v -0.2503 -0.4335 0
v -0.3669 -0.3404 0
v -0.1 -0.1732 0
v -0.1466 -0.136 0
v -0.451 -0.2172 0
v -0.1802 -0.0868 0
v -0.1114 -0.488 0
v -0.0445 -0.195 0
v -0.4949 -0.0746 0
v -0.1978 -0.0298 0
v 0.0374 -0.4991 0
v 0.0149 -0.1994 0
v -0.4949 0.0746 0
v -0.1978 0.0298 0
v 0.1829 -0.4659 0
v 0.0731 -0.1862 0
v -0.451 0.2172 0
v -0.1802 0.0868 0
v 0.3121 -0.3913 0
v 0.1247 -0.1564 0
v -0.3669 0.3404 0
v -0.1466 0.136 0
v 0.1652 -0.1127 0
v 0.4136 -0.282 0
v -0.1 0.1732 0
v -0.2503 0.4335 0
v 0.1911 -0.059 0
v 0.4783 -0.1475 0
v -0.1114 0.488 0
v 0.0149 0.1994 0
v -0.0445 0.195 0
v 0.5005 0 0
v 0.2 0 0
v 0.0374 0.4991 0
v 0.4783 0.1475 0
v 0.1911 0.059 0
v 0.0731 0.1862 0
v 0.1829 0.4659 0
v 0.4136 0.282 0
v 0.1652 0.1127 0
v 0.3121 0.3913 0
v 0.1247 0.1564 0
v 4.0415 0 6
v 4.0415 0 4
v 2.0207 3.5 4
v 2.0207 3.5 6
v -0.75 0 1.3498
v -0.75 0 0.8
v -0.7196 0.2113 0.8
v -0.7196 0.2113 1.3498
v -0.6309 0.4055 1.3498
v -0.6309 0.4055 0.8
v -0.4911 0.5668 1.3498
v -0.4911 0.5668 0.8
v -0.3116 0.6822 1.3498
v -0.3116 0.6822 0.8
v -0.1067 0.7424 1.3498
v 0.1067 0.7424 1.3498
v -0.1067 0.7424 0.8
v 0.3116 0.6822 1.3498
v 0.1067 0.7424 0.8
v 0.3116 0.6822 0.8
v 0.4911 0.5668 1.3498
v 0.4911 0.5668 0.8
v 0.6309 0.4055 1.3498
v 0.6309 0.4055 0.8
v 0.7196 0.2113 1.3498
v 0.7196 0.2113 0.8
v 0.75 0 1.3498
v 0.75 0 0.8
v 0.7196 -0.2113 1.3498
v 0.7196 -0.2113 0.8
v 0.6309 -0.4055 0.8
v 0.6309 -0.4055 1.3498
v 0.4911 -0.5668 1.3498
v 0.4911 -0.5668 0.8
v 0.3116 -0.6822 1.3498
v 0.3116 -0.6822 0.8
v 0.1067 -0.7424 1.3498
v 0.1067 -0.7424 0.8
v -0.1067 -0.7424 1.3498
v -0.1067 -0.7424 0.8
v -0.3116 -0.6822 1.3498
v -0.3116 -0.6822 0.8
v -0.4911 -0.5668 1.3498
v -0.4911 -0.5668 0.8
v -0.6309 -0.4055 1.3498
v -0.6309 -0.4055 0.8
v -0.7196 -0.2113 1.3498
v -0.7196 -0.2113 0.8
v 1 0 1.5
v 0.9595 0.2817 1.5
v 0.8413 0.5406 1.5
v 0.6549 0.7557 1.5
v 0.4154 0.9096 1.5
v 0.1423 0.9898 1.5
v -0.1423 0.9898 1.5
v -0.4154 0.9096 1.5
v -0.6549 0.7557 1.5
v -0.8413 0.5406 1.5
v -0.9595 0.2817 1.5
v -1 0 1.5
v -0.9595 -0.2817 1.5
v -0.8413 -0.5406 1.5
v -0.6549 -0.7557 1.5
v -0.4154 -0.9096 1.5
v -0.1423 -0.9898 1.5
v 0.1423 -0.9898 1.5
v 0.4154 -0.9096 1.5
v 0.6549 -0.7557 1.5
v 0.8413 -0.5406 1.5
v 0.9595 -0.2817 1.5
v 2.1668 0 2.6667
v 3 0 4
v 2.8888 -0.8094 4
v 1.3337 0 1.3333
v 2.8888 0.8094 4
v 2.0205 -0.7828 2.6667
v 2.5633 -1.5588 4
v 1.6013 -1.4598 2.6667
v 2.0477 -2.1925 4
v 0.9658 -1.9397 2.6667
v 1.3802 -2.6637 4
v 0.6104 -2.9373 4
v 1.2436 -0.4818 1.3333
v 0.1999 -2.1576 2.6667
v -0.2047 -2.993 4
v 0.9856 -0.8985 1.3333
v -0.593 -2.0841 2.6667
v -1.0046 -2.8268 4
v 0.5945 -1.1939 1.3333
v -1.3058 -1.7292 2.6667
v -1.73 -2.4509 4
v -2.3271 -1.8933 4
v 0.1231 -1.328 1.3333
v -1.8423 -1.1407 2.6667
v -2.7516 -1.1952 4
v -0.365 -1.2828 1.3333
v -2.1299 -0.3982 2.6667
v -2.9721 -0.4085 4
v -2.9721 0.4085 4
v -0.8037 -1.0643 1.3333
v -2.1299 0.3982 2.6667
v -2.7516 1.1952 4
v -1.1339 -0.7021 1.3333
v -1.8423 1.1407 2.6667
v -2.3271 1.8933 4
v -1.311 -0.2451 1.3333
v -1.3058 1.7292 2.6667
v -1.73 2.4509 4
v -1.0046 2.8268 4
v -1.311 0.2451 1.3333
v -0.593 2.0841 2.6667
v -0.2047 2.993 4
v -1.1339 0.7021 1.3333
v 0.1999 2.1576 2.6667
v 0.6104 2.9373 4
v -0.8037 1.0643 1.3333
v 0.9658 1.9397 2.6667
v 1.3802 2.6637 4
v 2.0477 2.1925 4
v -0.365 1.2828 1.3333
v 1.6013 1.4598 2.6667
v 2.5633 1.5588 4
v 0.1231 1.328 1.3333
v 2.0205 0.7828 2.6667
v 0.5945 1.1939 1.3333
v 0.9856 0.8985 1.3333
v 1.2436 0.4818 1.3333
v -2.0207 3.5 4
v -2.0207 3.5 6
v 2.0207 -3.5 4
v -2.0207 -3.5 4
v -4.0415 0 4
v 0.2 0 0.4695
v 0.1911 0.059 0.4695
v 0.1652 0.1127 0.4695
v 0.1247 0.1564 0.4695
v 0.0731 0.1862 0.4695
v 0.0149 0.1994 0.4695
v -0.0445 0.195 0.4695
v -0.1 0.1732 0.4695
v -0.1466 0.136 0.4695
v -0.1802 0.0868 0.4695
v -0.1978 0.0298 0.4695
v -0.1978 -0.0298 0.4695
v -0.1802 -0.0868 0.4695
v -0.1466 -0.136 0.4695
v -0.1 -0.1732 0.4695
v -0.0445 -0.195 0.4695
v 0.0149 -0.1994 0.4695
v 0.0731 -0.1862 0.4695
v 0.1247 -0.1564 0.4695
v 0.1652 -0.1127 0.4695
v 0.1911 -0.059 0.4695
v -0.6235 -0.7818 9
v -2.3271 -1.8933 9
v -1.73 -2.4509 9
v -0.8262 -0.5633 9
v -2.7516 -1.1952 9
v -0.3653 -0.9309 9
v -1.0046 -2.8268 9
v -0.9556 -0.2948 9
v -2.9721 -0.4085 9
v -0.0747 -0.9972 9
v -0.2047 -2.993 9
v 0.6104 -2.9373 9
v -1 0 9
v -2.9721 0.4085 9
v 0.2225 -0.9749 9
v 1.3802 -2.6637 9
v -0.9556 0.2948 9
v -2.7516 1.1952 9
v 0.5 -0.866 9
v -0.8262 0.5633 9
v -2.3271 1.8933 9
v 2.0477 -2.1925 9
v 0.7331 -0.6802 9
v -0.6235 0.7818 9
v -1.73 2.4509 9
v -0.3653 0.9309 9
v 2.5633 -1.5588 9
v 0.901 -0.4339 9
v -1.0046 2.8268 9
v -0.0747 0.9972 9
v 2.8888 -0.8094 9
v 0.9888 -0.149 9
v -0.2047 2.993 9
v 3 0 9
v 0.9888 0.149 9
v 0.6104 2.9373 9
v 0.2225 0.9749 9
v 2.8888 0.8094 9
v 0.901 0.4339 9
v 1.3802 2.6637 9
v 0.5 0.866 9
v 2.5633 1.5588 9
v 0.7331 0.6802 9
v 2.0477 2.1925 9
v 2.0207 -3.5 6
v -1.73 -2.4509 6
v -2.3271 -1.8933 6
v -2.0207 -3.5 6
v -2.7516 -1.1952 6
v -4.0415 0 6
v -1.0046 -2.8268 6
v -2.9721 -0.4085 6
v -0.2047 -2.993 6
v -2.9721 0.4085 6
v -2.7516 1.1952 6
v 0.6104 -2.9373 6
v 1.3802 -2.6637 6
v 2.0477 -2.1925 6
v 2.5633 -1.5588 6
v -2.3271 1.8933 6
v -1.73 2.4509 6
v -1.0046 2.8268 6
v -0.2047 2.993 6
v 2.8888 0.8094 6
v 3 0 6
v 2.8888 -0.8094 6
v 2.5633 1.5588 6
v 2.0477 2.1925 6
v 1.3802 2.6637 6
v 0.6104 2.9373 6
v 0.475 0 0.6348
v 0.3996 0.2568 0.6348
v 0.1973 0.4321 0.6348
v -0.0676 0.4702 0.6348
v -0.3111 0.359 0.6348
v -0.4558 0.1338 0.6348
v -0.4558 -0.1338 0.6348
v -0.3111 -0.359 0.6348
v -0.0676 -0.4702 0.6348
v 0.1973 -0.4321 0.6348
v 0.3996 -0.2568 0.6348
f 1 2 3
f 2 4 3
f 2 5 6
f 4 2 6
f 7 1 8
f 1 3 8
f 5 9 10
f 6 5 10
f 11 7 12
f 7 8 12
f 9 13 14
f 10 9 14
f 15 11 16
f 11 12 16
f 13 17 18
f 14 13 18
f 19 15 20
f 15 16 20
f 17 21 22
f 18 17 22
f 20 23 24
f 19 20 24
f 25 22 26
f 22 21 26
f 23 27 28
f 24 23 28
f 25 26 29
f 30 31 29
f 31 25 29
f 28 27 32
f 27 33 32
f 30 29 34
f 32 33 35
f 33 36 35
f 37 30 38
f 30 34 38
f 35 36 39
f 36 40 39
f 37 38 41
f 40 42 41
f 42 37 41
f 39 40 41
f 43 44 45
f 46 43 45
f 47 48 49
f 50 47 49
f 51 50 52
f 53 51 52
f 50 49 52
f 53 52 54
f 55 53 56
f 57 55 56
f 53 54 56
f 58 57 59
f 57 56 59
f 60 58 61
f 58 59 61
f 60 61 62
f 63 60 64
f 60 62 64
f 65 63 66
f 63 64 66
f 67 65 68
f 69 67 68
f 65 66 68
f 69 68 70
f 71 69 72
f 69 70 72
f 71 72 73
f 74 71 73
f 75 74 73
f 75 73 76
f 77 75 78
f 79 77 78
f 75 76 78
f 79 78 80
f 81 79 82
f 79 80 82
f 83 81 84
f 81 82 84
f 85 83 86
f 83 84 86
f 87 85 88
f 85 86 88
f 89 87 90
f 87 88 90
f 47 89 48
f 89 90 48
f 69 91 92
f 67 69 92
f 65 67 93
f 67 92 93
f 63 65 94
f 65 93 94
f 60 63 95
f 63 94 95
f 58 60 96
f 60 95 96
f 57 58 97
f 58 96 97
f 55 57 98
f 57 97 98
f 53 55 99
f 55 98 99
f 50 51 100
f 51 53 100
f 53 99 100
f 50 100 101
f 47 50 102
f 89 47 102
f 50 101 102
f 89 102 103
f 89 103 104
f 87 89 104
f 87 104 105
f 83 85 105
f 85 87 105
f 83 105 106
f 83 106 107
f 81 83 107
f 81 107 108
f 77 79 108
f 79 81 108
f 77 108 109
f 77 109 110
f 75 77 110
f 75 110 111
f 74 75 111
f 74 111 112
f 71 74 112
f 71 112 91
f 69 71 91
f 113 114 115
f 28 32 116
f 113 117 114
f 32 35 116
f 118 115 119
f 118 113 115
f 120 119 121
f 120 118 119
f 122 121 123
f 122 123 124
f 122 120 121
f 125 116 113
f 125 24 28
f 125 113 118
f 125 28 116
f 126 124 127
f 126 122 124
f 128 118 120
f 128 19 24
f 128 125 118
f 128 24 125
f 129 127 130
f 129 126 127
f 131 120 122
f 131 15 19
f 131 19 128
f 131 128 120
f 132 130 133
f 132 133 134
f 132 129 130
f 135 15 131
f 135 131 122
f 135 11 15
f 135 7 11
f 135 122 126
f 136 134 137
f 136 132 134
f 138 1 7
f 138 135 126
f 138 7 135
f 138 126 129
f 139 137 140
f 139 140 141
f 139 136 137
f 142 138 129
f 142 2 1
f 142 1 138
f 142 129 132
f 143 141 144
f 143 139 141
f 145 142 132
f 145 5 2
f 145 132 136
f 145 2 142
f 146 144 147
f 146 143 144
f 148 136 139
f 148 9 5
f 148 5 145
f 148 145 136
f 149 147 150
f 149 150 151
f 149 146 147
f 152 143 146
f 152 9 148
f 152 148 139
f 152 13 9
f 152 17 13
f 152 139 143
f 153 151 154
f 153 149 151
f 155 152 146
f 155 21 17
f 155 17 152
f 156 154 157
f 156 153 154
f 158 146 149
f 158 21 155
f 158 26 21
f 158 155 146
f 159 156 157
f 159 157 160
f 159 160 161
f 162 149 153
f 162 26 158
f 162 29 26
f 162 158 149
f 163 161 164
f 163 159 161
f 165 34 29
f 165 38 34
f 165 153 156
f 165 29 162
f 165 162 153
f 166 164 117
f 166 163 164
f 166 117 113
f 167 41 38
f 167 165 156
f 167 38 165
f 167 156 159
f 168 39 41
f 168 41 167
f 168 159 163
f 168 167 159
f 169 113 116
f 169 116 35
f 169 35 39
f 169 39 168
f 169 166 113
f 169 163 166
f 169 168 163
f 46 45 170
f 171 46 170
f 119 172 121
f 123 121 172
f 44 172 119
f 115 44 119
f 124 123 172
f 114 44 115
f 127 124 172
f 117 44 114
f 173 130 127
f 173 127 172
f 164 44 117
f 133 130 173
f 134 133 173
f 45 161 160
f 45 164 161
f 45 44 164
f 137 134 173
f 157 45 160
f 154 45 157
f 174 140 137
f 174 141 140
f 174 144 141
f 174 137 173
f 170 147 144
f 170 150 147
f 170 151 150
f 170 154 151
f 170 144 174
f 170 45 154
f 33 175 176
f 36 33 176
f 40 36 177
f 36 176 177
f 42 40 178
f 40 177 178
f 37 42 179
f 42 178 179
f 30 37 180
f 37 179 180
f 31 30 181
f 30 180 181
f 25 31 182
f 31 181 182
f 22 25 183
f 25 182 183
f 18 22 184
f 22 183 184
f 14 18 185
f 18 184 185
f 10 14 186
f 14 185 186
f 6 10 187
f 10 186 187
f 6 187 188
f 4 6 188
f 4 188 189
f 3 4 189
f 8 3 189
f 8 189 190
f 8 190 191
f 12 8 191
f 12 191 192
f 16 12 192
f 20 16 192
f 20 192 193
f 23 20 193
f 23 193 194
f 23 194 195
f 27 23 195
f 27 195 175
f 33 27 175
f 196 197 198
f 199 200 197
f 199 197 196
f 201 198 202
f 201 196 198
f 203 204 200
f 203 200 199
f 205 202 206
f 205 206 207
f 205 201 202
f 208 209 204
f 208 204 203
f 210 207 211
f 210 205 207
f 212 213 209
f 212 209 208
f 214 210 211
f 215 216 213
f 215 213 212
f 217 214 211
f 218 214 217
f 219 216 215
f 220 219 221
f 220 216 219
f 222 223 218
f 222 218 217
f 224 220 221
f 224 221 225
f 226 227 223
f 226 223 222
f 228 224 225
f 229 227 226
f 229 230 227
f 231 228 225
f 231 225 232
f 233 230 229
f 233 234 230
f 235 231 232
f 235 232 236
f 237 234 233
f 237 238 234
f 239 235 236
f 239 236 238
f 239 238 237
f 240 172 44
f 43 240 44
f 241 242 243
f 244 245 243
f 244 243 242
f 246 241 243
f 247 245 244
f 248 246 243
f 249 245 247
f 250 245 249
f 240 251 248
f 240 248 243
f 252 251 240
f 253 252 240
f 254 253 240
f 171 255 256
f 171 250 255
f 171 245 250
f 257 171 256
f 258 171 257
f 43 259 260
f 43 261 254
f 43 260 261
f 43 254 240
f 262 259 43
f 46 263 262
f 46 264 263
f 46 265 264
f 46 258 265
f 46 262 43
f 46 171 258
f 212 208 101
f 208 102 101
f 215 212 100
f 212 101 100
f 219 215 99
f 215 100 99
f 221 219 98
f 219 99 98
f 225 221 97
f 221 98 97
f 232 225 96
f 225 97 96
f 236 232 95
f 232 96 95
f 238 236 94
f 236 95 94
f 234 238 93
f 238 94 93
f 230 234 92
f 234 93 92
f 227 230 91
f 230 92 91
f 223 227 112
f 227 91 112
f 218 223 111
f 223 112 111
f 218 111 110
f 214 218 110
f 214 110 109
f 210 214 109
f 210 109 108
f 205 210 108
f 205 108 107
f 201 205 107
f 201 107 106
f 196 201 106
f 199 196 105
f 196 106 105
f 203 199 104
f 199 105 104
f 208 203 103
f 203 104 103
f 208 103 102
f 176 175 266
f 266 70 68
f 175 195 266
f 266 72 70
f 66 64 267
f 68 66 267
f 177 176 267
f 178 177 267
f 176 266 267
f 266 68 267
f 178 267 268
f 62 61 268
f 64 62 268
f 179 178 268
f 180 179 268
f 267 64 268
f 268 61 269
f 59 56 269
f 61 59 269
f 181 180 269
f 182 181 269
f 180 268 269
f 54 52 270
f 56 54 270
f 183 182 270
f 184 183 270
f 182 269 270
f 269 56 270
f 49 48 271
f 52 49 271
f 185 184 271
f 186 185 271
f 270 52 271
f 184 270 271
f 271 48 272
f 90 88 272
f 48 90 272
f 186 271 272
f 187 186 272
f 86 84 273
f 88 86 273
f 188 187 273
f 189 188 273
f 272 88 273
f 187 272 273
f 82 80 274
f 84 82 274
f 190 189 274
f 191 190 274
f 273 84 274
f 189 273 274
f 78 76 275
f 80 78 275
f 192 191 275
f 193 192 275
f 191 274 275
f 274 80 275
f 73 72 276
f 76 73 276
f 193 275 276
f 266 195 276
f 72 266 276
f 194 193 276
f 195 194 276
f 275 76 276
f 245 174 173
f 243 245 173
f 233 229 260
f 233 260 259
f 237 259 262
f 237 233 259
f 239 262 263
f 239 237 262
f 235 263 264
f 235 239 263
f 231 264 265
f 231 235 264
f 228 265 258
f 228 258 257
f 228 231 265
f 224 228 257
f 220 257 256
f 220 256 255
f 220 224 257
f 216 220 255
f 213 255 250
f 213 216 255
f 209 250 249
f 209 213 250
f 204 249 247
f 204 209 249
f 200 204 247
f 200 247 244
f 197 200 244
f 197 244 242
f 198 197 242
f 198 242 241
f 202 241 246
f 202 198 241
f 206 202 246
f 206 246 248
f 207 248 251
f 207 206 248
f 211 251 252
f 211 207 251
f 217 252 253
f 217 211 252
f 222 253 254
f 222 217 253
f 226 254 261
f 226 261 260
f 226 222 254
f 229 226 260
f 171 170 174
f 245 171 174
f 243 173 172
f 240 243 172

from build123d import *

# Parameters (mm, degrees)
BOSS_EXTRU_1_DEPTH                  = 9
ESQUISSE2_W                         = 15.557161579
ESQUISSE2_H                         = 11.468773674
ESQUISSE2_R                         = 3
ENL_V_MAT_EXTRU_1_DEPTH             = 3
DIAM_TRE_DU_PER_AGE_2_0_2_1_D       = 2
DIAM_TRE_DU_PER_AGE_2_0_2_1_DEPTH   = 7.5
DIAM_TRE_DU_PER_AGE_2_0_2_1_TIP     = 0.600860619
DIAM_TRE_DU_PER_AGE_1_5_1_5_1_D     = 1.5
DIAM_TRE_DU_PER_AGE_1_5_1_5_1_DEPTH = 8.2
DIAM_TRE_DU_PER_AGE_1_5_1_5_1_TIP   = 0.450645464
DIAM_TRE_DU_PER_AGE_0_4_0_4_1_D     = 0.4
DIAM_TRE_DU_PER_AGE_0_4_0_4_1_DEPTH = 0.7
DIAM_TRE_DU_PER_AGE_0_4_0_4_1_TIP   = 0.120172124
ENL_V_START                         = -4
ESQUISSE3_W                         = 15.323034965
ESQUISSE3_H                         = 11.861185192
ESQUISSE3_R                         = 3
ENL_V_MAT_EXTRU_3_DEPTH             = 4
CHANFREIN2_SIZE                     = 4
CHANFREIN2_SIZE_2                   = 2.499477408


with BuildPart() as part:
    # Esquisse1 → Boss.-Extru.1 (new body)
    with BuildSketch(Plane.XY):
        Polygon((4.041451884, 0), (2.020725942, 3.5), (-2.020725942, 3.5), (-4.041451884, 0), (-2.020725942, -3.5), (2.020725942, -3.5), align=None)
    extrude(amount=BOSS_EXTRU_1_DEPTH)

    # Esquisse2 → Enlèv. mat.-Extru.1 (cut)
    with BuildSketch(Plane.XY.offset(9)):
        with Locations((-0.212602531, -0.232116366)):
            Rectangle(ESQUISSE2_W, ESQUISSE2_H)
        Circle(ESQUISSE2_R, mode=Mode.SUBTRACT)
    extrude(amount=-ENL_V_MAT_EXTRU_1_DEPTH, mode=Mode.SUBTRACT)

    # Diamètre du perçage Ø2.0 (2)1
    with Locations(Plane.XY.offset(9)):
        with Locations((0, 0)):
            Hole(DIAM_TRE_DU_PER_AGE_2_0_2_1_D / 2, depth=DIAM_TRE_DU_PER_AGE_2_0_2_1_DEPTH)
            with Locations((0, 0, -(DIAM_TRE_DU_PER_AGE_2_0_2_1_DEPTH + DIAM_TRE_DU_PER_AGE_2_0_2_1_TIP / 2))):  # 118° drill point
                Cone(0, DIAM_TRE_DU_PER_AGE_2_0_2_1_D / 2, DIAM_TRE_DU_PER_AGE_2_0_2_1_TIP, mode=Mode.SUBTRACT)

    # Diamètre du perçage Ø1.5 (1.5)1
    with Locations(Plane.XY.offset(9)):
        with Locations((0, 0)):
            Hole(DIAM_TRE_DU_PER_AGE_1_5_1_5_1_D / 2, depth=DIAM_TRE_DU_PER_AGE_1_5_1_5_1_DEPTH)
            with Locations((0, 0, -(DIAM_TRE_DU_PER_AGE_1_5_1_5_1_DEPTH + DIAM_TRE_DU_PER_AGE_1_5_1_5_1_TIP / 2))):  # 118° drill point
                Cone(0, DIAM_TRE_DU_PER_AGE_1_5_1_5_1_D / 2, DIAM_TRE_DU_PER_AGE_1_5_1_5_1_TIP, mode=Mode.SUBTRACT)

    # Diamètre du perçage Ø0.4 (0.4)1
    with Locations(Plane(origin=(0, 0, 0), x_dir=(-1, 0, 0), z_dir=(0, 0, -1))):
        with Locations((0, 0)):
            Hole(DIAM_TRE_DU_PER_AGE_0_4_0_4_1_D / 2, depth=DIAM_TRE_DU_PER_AGE_0_4_0_4_1_DEPTH)
            with Locations((0, 0, -(DIAM_TRE_DU_PER_AGE_0_4_0_4_1_DEPTH + DIAM_TRE_DU_PER_AGE_0_4_0_4_1_TIP / 2))):  # 118° drill point
                Cone(0, DIAM_TRE_DU_PER_AGE_0_4_0_4_1_D / 2, DIAM_TRE_DU_PER_AGE_0_4_0_4_1_TIP, mode=Mode.SUBTRACT)

    # Esquisse3 → Enlèv. mat.-Extru.3 (cut)
    with BuildSketch(Plane(origin=(0, 0, 0), x_dir=(-1, 0, 0), z_dir=(0, 0, -1)).offset(ENL_V_START)):
        with Locations((0.20407301, -0.146192801)):
            Rectangle(ESQUISSE3_W, ESQUISSE3_H)
        with Locations(Location((0, 0, 0), (0, 0, 180))):
            Circle(ESQUISSE3_R, mode=Mode.SUBTRACT)
    extrude(amount=ENL_V_MAT_EXTRU_3_DEPTH, mode=Mode.SUBTRACT)

    # Chanfrein2
    # the kernel refuses this chamfer: 4, 2.499477408 mm, written as the material it takes off along each edge
    with BuildSketch(Plane(origin=(0, 0, 0), x_dir=(1, 0, 0), z_dir=(0, 1, 0))) as chanfrein2_piece_1_section:
        Polygon((3, -CHANFREIN2_SIZE), (3 - CHANFREIN2_SIZE_2, 0), (3, 0), align=None)
    chanfrein2_piece_1 = revolve(axis=Axis((0, 0, 0), (0, 0, -1)), mode=Mode.PRIVATE)
    chanfrein2_piece_1 = split(chanfrein2_piece_1, bisect_by=Plane(origin=(-1.744026904, 0, 4), z_dir=(0, 0, -1)), keep=Keep.TOP, mode=Mode.PRIVATE)
    add(chanfrein2_piece_1, mode=Mode.SUBTRACT)


solid = part.part
